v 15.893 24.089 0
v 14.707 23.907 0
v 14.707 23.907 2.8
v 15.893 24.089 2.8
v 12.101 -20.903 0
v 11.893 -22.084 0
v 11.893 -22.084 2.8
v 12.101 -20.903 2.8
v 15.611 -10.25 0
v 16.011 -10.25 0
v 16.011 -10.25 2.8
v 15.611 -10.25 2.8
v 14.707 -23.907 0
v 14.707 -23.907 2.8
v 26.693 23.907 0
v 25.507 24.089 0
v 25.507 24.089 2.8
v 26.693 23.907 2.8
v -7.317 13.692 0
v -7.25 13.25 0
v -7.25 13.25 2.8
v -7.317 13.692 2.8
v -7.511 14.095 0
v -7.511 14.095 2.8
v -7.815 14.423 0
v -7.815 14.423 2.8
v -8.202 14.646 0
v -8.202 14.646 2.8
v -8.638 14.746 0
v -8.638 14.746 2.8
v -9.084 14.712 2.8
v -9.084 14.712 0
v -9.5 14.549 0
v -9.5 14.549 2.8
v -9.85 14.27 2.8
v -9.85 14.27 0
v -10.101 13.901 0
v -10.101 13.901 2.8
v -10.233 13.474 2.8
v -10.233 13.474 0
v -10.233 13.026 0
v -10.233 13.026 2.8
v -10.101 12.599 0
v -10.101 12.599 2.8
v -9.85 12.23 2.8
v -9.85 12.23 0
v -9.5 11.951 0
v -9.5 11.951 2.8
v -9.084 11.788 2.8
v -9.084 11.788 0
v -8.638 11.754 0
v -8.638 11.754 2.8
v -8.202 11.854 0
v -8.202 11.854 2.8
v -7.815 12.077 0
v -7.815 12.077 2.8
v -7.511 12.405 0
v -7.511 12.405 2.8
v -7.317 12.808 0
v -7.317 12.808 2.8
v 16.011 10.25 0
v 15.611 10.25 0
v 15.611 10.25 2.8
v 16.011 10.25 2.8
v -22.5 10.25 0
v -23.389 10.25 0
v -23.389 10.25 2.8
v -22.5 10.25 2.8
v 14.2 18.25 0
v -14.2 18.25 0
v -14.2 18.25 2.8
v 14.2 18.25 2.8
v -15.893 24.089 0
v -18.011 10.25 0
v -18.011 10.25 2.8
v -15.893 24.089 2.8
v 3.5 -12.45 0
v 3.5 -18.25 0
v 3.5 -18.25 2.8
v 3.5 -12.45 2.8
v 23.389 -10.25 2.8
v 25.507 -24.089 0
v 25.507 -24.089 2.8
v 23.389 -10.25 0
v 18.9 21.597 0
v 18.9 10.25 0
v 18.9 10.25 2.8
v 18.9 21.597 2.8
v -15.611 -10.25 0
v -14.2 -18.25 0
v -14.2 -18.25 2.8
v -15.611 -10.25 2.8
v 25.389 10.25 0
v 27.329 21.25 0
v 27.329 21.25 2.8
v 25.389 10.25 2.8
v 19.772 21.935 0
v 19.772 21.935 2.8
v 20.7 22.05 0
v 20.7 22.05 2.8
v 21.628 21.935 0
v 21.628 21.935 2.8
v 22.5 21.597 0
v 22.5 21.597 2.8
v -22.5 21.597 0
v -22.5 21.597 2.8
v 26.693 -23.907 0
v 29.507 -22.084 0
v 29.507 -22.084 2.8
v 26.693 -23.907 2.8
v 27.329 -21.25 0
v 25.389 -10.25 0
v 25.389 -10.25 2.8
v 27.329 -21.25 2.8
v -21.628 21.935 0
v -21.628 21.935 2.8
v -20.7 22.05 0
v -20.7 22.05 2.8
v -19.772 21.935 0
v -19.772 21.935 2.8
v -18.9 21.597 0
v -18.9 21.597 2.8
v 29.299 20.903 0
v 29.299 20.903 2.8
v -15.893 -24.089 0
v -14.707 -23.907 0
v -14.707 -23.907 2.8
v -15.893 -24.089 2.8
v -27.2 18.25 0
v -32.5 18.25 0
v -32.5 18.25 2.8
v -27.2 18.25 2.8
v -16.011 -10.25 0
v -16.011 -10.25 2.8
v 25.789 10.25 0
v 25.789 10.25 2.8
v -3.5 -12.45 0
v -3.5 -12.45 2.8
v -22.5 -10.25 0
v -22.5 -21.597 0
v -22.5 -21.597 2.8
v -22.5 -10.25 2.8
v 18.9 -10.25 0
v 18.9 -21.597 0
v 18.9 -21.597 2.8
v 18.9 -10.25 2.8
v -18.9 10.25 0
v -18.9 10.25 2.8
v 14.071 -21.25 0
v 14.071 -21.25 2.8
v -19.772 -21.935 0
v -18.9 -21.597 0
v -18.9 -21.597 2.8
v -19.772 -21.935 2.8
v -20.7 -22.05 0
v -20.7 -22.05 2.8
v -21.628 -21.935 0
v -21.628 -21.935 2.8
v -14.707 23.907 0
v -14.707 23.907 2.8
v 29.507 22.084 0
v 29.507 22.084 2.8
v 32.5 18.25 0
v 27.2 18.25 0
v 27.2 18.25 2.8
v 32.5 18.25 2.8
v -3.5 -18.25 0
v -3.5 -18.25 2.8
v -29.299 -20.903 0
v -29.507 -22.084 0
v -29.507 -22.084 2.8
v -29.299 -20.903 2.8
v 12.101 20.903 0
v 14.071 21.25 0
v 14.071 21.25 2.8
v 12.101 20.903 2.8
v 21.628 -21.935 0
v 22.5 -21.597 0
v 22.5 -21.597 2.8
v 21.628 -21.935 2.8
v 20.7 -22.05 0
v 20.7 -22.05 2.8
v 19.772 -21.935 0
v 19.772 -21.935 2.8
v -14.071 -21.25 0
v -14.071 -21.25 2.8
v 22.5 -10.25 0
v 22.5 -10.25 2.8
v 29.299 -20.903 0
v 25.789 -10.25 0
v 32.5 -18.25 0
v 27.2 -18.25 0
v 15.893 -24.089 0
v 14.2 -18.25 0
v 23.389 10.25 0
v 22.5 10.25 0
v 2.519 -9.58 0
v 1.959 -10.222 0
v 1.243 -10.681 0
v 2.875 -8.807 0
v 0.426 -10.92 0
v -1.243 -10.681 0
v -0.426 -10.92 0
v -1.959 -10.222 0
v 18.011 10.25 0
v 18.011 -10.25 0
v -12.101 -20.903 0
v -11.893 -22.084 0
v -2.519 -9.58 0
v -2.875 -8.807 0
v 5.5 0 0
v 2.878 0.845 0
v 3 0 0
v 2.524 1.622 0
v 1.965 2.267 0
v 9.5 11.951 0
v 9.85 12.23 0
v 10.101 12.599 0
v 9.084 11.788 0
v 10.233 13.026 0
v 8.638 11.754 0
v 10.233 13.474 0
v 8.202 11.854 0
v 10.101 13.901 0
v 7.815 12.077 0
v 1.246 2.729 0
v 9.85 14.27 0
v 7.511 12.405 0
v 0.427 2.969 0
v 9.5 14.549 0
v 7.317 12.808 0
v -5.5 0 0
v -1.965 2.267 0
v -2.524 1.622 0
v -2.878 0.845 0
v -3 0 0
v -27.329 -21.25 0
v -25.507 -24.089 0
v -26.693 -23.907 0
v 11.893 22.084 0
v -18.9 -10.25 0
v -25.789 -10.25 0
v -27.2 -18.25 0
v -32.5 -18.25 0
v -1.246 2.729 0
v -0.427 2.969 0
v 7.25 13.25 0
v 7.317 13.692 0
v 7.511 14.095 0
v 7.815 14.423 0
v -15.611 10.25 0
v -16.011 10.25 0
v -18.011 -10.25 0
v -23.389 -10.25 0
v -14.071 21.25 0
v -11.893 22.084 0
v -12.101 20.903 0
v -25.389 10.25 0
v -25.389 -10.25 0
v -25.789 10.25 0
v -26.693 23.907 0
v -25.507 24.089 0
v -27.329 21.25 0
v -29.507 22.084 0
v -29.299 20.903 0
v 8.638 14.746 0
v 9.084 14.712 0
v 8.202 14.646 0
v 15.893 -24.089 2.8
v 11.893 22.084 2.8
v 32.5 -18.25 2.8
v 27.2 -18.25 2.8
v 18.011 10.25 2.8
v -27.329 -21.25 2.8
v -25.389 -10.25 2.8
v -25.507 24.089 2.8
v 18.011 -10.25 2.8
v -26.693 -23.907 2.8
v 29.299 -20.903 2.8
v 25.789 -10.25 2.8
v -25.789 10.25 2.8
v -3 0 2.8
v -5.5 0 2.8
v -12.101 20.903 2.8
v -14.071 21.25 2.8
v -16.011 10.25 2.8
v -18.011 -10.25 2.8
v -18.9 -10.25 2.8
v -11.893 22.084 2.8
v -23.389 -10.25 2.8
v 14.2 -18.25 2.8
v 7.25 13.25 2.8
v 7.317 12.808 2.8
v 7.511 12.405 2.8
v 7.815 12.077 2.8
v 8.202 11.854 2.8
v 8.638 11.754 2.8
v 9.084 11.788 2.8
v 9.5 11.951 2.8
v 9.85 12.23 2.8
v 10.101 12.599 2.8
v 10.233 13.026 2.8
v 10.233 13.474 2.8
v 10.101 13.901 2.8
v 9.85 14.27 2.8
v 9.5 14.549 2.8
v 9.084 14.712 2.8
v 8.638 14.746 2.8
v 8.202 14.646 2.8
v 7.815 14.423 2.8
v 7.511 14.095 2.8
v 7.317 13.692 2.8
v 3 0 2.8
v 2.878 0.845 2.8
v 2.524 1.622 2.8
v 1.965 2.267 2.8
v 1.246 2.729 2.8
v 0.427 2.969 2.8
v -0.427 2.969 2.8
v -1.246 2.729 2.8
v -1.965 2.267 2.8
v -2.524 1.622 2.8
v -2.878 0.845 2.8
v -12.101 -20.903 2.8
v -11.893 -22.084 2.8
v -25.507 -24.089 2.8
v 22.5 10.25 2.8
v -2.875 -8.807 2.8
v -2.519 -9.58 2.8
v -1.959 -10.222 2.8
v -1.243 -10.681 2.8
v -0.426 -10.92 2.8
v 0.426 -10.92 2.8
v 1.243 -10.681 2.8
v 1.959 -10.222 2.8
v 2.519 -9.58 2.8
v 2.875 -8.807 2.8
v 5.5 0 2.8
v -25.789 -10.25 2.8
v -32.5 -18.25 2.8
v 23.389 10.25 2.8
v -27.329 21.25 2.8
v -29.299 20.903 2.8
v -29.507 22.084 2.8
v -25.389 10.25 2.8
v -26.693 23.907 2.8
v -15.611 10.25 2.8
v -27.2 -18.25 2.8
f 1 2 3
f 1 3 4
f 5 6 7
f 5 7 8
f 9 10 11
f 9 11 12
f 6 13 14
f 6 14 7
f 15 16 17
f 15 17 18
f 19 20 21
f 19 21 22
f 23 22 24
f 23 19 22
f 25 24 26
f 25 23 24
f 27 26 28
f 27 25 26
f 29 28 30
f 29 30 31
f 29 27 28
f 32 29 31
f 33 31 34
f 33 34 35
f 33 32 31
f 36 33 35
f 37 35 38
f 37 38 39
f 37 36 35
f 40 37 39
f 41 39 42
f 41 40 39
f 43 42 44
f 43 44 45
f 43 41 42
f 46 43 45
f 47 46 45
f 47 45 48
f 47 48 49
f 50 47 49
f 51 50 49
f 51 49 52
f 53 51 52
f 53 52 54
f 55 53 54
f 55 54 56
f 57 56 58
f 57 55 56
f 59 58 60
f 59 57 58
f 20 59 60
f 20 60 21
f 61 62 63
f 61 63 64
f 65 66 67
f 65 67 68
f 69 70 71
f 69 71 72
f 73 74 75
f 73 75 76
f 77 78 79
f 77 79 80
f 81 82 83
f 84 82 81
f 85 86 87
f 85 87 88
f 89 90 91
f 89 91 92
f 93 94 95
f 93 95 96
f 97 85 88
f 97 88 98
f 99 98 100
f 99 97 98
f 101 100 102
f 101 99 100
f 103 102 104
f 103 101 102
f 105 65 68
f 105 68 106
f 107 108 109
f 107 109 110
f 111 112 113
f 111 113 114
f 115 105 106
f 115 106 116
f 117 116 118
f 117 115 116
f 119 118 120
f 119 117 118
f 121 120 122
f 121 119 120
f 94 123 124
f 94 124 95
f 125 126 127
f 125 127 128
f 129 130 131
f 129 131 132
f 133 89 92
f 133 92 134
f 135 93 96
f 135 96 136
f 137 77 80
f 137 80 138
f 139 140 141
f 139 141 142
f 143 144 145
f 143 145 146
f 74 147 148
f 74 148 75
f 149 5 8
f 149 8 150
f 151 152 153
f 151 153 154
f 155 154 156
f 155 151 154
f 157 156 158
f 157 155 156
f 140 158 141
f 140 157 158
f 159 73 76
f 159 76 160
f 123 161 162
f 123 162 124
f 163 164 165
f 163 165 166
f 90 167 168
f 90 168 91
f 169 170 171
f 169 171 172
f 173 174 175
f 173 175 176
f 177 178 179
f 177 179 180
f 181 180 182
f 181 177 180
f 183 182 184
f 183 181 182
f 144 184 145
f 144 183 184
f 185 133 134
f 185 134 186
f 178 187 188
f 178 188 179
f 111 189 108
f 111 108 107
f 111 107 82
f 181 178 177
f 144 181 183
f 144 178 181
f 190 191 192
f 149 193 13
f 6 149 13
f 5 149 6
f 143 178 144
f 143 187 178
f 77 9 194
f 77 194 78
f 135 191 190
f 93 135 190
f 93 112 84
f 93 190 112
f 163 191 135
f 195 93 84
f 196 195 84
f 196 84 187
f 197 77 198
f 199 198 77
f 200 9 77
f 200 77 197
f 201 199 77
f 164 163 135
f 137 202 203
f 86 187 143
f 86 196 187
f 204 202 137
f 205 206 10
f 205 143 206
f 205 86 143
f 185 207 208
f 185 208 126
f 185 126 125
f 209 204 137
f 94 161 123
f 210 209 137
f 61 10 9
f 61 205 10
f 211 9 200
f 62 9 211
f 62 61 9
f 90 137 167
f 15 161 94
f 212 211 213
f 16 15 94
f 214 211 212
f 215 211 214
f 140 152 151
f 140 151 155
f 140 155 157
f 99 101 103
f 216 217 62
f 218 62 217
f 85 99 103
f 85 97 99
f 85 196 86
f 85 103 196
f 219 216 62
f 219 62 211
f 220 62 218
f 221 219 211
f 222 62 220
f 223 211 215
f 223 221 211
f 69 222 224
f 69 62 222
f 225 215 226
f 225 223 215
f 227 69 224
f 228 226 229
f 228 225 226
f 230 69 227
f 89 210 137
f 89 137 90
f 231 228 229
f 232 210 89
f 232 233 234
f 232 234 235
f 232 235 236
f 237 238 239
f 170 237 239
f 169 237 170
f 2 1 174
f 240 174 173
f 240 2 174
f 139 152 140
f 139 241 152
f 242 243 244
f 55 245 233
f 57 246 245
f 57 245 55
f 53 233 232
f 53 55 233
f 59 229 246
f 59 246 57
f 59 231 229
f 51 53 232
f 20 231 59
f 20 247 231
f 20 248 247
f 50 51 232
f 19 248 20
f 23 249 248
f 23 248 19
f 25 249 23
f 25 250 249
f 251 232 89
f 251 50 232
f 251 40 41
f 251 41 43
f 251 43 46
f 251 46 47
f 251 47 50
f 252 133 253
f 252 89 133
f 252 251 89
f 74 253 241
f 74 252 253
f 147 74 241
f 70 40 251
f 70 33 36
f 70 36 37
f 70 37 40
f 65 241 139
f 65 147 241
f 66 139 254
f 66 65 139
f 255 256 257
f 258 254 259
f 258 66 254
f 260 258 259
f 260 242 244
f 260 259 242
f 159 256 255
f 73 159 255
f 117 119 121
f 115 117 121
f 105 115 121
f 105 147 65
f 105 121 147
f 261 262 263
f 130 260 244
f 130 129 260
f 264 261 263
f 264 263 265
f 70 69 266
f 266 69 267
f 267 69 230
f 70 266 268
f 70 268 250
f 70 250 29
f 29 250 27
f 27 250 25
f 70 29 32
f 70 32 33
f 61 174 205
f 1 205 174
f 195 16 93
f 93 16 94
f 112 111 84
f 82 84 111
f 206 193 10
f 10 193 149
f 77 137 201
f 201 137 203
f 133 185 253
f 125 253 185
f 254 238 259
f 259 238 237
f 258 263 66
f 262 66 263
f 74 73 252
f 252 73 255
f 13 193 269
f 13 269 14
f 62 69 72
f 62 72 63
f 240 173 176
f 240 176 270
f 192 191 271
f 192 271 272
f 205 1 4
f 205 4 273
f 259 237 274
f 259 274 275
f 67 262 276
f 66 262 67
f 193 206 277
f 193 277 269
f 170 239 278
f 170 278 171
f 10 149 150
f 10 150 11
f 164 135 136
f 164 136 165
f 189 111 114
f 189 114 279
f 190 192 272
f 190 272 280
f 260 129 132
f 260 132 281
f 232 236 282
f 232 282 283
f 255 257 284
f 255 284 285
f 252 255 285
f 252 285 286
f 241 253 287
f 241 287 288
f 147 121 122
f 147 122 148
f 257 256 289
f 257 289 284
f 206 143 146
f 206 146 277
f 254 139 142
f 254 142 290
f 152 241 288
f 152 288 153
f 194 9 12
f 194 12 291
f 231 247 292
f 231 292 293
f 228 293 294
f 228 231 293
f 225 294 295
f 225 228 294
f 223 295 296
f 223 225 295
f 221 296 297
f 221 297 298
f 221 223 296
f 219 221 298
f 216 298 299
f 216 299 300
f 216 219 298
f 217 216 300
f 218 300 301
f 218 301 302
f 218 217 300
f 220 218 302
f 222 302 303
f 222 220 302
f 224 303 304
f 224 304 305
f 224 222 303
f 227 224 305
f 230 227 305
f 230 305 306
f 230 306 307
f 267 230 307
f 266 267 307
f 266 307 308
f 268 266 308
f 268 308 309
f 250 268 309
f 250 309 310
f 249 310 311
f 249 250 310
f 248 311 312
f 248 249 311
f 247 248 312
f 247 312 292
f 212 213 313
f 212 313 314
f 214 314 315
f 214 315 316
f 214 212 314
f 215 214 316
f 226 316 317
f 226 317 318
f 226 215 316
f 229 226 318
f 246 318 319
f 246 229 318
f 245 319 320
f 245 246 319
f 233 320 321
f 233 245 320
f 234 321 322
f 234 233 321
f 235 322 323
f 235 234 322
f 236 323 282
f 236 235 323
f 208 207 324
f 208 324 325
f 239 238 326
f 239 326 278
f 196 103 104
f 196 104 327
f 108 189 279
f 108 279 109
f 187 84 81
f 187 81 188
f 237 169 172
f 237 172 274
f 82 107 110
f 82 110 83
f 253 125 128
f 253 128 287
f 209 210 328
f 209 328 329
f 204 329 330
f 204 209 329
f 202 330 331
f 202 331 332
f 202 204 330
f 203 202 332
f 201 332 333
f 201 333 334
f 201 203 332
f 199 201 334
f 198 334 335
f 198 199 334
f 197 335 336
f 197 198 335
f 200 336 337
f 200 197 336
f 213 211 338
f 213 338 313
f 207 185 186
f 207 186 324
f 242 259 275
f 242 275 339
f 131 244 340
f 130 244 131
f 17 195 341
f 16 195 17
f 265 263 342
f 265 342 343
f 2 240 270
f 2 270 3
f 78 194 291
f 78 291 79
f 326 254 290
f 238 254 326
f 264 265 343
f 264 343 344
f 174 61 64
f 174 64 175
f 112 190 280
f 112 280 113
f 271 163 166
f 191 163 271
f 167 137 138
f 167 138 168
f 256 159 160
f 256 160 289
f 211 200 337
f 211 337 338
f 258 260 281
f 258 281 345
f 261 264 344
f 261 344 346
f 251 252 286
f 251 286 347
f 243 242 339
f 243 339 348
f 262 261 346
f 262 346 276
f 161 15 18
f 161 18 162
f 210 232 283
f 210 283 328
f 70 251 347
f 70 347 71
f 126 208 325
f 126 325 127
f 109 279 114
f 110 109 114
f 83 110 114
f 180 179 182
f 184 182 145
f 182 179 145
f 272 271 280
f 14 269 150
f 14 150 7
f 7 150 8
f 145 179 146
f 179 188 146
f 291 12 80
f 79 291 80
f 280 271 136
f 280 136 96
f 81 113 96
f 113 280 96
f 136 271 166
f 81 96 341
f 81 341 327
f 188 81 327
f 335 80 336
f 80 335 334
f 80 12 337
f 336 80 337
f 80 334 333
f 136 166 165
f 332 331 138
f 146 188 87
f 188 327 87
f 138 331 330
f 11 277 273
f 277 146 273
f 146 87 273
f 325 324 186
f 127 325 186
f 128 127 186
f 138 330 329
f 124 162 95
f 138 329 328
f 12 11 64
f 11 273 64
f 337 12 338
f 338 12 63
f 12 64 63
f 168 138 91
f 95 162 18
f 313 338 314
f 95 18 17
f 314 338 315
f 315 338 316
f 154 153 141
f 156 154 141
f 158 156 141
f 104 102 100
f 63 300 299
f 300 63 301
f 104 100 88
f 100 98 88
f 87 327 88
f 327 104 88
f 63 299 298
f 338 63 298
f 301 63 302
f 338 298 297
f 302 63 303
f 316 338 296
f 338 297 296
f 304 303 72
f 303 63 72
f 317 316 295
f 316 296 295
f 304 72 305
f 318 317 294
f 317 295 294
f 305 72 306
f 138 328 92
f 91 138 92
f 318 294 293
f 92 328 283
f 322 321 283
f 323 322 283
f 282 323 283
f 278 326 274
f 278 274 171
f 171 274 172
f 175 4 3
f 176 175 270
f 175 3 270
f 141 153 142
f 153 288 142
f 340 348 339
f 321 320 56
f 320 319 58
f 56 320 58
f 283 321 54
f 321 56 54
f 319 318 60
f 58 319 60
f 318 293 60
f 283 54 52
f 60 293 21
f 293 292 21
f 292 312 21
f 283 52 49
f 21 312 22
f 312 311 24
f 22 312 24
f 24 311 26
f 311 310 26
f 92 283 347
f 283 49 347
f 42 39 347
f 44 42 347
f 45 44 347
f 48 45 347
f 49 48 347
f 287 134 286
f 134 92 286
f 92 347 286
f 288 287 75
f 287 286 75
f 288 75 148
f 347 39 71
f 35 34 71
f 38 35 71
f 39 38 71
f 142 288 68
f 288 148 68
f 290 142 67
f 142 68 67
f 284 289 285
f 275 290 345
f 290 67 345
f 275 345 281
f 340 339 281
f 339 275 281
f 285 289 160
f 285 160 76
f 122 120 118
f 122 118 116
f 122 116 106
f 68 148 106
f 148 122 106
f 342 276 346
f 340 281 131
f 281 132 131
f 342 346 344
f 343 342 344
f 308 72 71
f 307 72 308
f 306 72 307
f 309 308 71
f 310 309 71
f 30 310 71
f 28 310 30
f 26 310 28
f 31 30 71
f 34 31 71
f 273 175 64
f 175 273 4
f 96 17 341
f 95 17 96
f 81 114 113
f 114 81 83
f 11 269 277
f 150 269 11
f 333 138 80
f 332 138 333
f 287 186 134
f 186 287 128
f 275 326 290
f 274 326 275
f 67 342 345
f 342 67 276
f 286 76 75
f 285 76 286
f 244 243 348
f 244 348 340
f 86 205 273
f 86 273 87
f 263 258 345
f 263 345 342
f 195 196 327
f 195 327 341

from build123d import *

# Parameters (mm, degrees)
MODEL_R                 = 1.5
P_IDAT_VYSUNUT_M1_DEPTH = 2.8


with BuildPart() as part:
    # Model → Přidat vysunutím1 (new body)
    with BuildSketch(Plane.XY):
        with BuildLine():
            Line((-14.2, 18.25), (14.2, 18.25))
            Line((14.2, 18.25), (15.610615846, 10.25))
            Line((15.610615846, 10.25), (16.010615846, 10.25))
            Line((16.010615846, 10.25), (14.071019058, 21.25))
            Line((14.071019058, 21.25), (12.101403552, 20.902703645))
            Line((12.101403552, 20.902703645), (11.893025739, 22.084472948))
            Line((11.893025739, 22.084472948), (14.706771698, 23.907401431))
            Line((14.706771698, 23.907401431), (15.892964362, 24.088914415))
            Line((15.892964362, 24.088914415), (18.010615846, 10.25))
            Line((18.010615846, 10.25), (18.9, 10.25))
            Line((18.9, 10.25), (18.9, 21.596640106))
            ThreePointArc((18.9, 21.596640106), (20.7, 22.05), (22.5, 21.596640106))
            Line((22.5, 21.596640106), (22.5, 10.25))
            Line((22.5, 10.25), (23.389384154, 10.25))
            Line((23.389384154, 10.25), (25.507035638, 24.088914415))
            Line((25.507035638, 24.088914415), (26.693228302, 23.907401431))
            Line((26.693228302, 23.907401431), (29.506974261, 22.084472948))
            Line((29.506974261, 22.084472948), (29.298596448, 20.902703645))
            Line((29.298596448, 20.902703645), (27.328980942, 21.25))
            Line((27.328980942, 21.25), (25.389384154, 10.25))
            Line((25.389384154, 10.25), (25.789384154, 10.25))
            Line((25.789384154, 10.25), (27.2, 18.25))
            Line((27.2, 18.25), (32.5, 18.25))
            Line((32.5, 18.25), (32.5, -18.25))
            Line((32.5, -18.25), (27.2, -18.25))
            Line((27.2, -18.25), (25.789384154, -10.25))
            Line((25.789384154, -10.25), (25.389384154, -10.25))
            Line((25.389384154, -10.25), (27.328980942, -21.25))
            Line((27.328980942, -21.25), (29.298596448, -20.902703645))
            Line((29.298596448, -20.902703645), (29.506974261, -22.084472948))
            Line((29.506974261, -22.084472948), (26.693228302, -23.907401431))
            Line((26.693228302, -23.907401431), (25.507035638, -24.088914415))
            Line((25.507035638, -24.088914415), (23.389384154, -10.25))
            Line((23.389384154, -10.25), (22.5, -10.25))
            Line((22.5, -10.25), (22.5, -21.596640106))
            ThreePointArc((22.5, -21.596640106), (20.7, -22.05), (18.9, -21.596640106))
            Line((18.9, -21.596640106), (18.9, -10.25))
            Line((18.9, -10.25), (18.010615846, -10.25))
            Line((18.010615846, -10.25), (15.892964362, -24.088914415))
            Line((15.892964362, -24.088914415), (14.706771698, -23.907401431))
            Line((14.706771698, -23.907401431), (11.893025739, -22.084472948))
            Line((11.893025739, -22.084472948), (12.101403552, -20.902703645))
            Line((12.101403552, -20.902703645), (14.071019058, -21.25))
            Line((14.071019058, -21.25), (16.010615846, -10.25))
            Line((16.010615846, -10.25), (15.610615846, -10.25))
            Line((15.610615846, -10.25), (14.2, -18.25))
            Line((14.2, -18.25), (3.5, -18.25))
            Line((3.5, -18.25), (3.5, -12.45))
            Line((3.5, -12.45), (-3.5, -12.45))
            Line((-3.5, -12.45), (-3.5, -18.25))
            Line((-3.5, -18.25), (-14.2, -18.25))
            Line((-14.2, -18.25), (-15.610615846, -10.25))
            Line((-15.610615846, -10.25), (-16.010615846, -10.25))
            Line((-16.010615846, -10.25), (-14.071019058, -21.25))
            Line((-14.071019058, -21.25), (-12.101403552, -20.902703645))
            Line((-12.101403552, -20.902703645), (-11.893025739, -22.084472948))
            Line((-11.893025739, -22.084472948), (-14.706771698, -23.907401431))
            Line((-14.706771698, -23.907401431), (-15.892964362, -24.088914415))
            Line((-15.892964362, -24.088914415), (-18.010615846, -10.25))
            Line((-18.010615846, -10.25), (-18.9, -10.25))
            Line((-18.9, -10.25), (-18.9, -21.596640106))
            ThreePointArc((-18.9, -21.596640106), (-20.7, -22.05), (-22.5, -21.596640106))
            Line((-22.5, -21.596640106), (-22.5, -10.25))
            Line((-22.5, -10.25), (-23.389384154, -10.25))
            Line((-23.389384154, -10.25), (-25.507035638, -24.088914415))
            Line((-25.507035638, -24.088914415), (-26.693228302, -23.907401431))
            Line((-26.693228302, -23.907401431), (-29.506974261, -22.084472948))
            Line((-29.506974261, -22.084472948), (-29.298596448, -20.902703645))
            Line((-29.298596448, -20.902703645), (-27.328980942, -21.25))
            Line((-27.328980942, -21.25), (-25.389384154, -10.25))
            Line((-25.389384154, -10.25), (-25.789384154, -10.25))
            Line((-25.789384154, -10.25), (-27.2, -18.25))
            Line((-27.2, -18.25), (-32.5, -18.25))
            Line((-32.5, -18.25), (-32.5, 18.25))
            Line((-32.5, 18.25), (-27.2, 18.25))
            Line((-27.2, 18.25), (-25.789384154, 10.25))
            Line((-25.789384154, 10.25), (-25.389384154, 10.25))
            Line((-25.389384154, 10.25), (-27.328980942, 21.25))
            Line((-27.328980942, 21.25), (-29.298596448, 20.902703645))
            Line((-29.298596448, 20.902703645), (-29.506974261, 22.084472948))
            Line((-29.506974261, 22.084472948), (-26.693228302, 23.907401431))
            Line((-26.693228302, 23.907401431), (-25.507035638, 24.088914415))
            Line((-25.507035638, 24.088914415), (-23.389384154, 10.25))
            Line((-23.389384154, 10.25), (-22.5, 10.25))
            Line((-22.5, 10.25), (-22.5, 21.596640106))
            ThreePointArc((-22.5, 21.596640106), (-20.7, 22.05), (-18.9, 21.596640106))
            Line((-18.9, 21.596640106), (-18.9, 10.25))
            Line((-18.9, 10.25), (-18.010615846, 10.25))
            Line((-18.010615846, 10.25), (-15.892964362, 24.088914415))
            Line((-15.892964362, 24.088914415), (-14.706771698, 23.907401431))
            Line((-14.706771698, 23.907401431), (-11.893025739, 22.084472948))
            Line((-11.893025739, 22.084472948), (-12.101403552, 20.902703645))
            Line((-12.101403552, 20.902703645), (-14.071019058, 21.25))
            Line((-14.071019058, 21.25), (-16.010615846, 10.25))
            Line((-16.010615846, 10.25), (-15.610615846, 10.25))
            Line((-15.610615846, 10.25), (-14.2, 18.25))
        make_face()
        with Locations((-8.75, 13.25)):
            Circle(MODEL_R, mode=Mode.SUBTRACT)
        with Locations(Location((8.75, 13.25, 0), (0, 0, 180))):
            Circle(MODEL_R, mode=Mode.SUBTRACT)
        with BuildLine():
            Line((2.875009535, -8.806924836), (5.5, 0))
            Line((5.5, 0), (3, 0))
            ThreePointArc((3, 0), (0, 3), (-3, 0))
            Line((-3, 0), (-5.5, 0))
            Line((-5.5, 0), (-2.875009535, -8.806924836))
            ThreePointArc((-2.875009535, -8.806924836), (0, -10.95), (2.875009535, -8.806924836))
        make_face(mode=Mode.SUBTRACT)
    extrude(amount=P_IDAT_VYSUNUT_M1_DEPTH)


solid = part.part
